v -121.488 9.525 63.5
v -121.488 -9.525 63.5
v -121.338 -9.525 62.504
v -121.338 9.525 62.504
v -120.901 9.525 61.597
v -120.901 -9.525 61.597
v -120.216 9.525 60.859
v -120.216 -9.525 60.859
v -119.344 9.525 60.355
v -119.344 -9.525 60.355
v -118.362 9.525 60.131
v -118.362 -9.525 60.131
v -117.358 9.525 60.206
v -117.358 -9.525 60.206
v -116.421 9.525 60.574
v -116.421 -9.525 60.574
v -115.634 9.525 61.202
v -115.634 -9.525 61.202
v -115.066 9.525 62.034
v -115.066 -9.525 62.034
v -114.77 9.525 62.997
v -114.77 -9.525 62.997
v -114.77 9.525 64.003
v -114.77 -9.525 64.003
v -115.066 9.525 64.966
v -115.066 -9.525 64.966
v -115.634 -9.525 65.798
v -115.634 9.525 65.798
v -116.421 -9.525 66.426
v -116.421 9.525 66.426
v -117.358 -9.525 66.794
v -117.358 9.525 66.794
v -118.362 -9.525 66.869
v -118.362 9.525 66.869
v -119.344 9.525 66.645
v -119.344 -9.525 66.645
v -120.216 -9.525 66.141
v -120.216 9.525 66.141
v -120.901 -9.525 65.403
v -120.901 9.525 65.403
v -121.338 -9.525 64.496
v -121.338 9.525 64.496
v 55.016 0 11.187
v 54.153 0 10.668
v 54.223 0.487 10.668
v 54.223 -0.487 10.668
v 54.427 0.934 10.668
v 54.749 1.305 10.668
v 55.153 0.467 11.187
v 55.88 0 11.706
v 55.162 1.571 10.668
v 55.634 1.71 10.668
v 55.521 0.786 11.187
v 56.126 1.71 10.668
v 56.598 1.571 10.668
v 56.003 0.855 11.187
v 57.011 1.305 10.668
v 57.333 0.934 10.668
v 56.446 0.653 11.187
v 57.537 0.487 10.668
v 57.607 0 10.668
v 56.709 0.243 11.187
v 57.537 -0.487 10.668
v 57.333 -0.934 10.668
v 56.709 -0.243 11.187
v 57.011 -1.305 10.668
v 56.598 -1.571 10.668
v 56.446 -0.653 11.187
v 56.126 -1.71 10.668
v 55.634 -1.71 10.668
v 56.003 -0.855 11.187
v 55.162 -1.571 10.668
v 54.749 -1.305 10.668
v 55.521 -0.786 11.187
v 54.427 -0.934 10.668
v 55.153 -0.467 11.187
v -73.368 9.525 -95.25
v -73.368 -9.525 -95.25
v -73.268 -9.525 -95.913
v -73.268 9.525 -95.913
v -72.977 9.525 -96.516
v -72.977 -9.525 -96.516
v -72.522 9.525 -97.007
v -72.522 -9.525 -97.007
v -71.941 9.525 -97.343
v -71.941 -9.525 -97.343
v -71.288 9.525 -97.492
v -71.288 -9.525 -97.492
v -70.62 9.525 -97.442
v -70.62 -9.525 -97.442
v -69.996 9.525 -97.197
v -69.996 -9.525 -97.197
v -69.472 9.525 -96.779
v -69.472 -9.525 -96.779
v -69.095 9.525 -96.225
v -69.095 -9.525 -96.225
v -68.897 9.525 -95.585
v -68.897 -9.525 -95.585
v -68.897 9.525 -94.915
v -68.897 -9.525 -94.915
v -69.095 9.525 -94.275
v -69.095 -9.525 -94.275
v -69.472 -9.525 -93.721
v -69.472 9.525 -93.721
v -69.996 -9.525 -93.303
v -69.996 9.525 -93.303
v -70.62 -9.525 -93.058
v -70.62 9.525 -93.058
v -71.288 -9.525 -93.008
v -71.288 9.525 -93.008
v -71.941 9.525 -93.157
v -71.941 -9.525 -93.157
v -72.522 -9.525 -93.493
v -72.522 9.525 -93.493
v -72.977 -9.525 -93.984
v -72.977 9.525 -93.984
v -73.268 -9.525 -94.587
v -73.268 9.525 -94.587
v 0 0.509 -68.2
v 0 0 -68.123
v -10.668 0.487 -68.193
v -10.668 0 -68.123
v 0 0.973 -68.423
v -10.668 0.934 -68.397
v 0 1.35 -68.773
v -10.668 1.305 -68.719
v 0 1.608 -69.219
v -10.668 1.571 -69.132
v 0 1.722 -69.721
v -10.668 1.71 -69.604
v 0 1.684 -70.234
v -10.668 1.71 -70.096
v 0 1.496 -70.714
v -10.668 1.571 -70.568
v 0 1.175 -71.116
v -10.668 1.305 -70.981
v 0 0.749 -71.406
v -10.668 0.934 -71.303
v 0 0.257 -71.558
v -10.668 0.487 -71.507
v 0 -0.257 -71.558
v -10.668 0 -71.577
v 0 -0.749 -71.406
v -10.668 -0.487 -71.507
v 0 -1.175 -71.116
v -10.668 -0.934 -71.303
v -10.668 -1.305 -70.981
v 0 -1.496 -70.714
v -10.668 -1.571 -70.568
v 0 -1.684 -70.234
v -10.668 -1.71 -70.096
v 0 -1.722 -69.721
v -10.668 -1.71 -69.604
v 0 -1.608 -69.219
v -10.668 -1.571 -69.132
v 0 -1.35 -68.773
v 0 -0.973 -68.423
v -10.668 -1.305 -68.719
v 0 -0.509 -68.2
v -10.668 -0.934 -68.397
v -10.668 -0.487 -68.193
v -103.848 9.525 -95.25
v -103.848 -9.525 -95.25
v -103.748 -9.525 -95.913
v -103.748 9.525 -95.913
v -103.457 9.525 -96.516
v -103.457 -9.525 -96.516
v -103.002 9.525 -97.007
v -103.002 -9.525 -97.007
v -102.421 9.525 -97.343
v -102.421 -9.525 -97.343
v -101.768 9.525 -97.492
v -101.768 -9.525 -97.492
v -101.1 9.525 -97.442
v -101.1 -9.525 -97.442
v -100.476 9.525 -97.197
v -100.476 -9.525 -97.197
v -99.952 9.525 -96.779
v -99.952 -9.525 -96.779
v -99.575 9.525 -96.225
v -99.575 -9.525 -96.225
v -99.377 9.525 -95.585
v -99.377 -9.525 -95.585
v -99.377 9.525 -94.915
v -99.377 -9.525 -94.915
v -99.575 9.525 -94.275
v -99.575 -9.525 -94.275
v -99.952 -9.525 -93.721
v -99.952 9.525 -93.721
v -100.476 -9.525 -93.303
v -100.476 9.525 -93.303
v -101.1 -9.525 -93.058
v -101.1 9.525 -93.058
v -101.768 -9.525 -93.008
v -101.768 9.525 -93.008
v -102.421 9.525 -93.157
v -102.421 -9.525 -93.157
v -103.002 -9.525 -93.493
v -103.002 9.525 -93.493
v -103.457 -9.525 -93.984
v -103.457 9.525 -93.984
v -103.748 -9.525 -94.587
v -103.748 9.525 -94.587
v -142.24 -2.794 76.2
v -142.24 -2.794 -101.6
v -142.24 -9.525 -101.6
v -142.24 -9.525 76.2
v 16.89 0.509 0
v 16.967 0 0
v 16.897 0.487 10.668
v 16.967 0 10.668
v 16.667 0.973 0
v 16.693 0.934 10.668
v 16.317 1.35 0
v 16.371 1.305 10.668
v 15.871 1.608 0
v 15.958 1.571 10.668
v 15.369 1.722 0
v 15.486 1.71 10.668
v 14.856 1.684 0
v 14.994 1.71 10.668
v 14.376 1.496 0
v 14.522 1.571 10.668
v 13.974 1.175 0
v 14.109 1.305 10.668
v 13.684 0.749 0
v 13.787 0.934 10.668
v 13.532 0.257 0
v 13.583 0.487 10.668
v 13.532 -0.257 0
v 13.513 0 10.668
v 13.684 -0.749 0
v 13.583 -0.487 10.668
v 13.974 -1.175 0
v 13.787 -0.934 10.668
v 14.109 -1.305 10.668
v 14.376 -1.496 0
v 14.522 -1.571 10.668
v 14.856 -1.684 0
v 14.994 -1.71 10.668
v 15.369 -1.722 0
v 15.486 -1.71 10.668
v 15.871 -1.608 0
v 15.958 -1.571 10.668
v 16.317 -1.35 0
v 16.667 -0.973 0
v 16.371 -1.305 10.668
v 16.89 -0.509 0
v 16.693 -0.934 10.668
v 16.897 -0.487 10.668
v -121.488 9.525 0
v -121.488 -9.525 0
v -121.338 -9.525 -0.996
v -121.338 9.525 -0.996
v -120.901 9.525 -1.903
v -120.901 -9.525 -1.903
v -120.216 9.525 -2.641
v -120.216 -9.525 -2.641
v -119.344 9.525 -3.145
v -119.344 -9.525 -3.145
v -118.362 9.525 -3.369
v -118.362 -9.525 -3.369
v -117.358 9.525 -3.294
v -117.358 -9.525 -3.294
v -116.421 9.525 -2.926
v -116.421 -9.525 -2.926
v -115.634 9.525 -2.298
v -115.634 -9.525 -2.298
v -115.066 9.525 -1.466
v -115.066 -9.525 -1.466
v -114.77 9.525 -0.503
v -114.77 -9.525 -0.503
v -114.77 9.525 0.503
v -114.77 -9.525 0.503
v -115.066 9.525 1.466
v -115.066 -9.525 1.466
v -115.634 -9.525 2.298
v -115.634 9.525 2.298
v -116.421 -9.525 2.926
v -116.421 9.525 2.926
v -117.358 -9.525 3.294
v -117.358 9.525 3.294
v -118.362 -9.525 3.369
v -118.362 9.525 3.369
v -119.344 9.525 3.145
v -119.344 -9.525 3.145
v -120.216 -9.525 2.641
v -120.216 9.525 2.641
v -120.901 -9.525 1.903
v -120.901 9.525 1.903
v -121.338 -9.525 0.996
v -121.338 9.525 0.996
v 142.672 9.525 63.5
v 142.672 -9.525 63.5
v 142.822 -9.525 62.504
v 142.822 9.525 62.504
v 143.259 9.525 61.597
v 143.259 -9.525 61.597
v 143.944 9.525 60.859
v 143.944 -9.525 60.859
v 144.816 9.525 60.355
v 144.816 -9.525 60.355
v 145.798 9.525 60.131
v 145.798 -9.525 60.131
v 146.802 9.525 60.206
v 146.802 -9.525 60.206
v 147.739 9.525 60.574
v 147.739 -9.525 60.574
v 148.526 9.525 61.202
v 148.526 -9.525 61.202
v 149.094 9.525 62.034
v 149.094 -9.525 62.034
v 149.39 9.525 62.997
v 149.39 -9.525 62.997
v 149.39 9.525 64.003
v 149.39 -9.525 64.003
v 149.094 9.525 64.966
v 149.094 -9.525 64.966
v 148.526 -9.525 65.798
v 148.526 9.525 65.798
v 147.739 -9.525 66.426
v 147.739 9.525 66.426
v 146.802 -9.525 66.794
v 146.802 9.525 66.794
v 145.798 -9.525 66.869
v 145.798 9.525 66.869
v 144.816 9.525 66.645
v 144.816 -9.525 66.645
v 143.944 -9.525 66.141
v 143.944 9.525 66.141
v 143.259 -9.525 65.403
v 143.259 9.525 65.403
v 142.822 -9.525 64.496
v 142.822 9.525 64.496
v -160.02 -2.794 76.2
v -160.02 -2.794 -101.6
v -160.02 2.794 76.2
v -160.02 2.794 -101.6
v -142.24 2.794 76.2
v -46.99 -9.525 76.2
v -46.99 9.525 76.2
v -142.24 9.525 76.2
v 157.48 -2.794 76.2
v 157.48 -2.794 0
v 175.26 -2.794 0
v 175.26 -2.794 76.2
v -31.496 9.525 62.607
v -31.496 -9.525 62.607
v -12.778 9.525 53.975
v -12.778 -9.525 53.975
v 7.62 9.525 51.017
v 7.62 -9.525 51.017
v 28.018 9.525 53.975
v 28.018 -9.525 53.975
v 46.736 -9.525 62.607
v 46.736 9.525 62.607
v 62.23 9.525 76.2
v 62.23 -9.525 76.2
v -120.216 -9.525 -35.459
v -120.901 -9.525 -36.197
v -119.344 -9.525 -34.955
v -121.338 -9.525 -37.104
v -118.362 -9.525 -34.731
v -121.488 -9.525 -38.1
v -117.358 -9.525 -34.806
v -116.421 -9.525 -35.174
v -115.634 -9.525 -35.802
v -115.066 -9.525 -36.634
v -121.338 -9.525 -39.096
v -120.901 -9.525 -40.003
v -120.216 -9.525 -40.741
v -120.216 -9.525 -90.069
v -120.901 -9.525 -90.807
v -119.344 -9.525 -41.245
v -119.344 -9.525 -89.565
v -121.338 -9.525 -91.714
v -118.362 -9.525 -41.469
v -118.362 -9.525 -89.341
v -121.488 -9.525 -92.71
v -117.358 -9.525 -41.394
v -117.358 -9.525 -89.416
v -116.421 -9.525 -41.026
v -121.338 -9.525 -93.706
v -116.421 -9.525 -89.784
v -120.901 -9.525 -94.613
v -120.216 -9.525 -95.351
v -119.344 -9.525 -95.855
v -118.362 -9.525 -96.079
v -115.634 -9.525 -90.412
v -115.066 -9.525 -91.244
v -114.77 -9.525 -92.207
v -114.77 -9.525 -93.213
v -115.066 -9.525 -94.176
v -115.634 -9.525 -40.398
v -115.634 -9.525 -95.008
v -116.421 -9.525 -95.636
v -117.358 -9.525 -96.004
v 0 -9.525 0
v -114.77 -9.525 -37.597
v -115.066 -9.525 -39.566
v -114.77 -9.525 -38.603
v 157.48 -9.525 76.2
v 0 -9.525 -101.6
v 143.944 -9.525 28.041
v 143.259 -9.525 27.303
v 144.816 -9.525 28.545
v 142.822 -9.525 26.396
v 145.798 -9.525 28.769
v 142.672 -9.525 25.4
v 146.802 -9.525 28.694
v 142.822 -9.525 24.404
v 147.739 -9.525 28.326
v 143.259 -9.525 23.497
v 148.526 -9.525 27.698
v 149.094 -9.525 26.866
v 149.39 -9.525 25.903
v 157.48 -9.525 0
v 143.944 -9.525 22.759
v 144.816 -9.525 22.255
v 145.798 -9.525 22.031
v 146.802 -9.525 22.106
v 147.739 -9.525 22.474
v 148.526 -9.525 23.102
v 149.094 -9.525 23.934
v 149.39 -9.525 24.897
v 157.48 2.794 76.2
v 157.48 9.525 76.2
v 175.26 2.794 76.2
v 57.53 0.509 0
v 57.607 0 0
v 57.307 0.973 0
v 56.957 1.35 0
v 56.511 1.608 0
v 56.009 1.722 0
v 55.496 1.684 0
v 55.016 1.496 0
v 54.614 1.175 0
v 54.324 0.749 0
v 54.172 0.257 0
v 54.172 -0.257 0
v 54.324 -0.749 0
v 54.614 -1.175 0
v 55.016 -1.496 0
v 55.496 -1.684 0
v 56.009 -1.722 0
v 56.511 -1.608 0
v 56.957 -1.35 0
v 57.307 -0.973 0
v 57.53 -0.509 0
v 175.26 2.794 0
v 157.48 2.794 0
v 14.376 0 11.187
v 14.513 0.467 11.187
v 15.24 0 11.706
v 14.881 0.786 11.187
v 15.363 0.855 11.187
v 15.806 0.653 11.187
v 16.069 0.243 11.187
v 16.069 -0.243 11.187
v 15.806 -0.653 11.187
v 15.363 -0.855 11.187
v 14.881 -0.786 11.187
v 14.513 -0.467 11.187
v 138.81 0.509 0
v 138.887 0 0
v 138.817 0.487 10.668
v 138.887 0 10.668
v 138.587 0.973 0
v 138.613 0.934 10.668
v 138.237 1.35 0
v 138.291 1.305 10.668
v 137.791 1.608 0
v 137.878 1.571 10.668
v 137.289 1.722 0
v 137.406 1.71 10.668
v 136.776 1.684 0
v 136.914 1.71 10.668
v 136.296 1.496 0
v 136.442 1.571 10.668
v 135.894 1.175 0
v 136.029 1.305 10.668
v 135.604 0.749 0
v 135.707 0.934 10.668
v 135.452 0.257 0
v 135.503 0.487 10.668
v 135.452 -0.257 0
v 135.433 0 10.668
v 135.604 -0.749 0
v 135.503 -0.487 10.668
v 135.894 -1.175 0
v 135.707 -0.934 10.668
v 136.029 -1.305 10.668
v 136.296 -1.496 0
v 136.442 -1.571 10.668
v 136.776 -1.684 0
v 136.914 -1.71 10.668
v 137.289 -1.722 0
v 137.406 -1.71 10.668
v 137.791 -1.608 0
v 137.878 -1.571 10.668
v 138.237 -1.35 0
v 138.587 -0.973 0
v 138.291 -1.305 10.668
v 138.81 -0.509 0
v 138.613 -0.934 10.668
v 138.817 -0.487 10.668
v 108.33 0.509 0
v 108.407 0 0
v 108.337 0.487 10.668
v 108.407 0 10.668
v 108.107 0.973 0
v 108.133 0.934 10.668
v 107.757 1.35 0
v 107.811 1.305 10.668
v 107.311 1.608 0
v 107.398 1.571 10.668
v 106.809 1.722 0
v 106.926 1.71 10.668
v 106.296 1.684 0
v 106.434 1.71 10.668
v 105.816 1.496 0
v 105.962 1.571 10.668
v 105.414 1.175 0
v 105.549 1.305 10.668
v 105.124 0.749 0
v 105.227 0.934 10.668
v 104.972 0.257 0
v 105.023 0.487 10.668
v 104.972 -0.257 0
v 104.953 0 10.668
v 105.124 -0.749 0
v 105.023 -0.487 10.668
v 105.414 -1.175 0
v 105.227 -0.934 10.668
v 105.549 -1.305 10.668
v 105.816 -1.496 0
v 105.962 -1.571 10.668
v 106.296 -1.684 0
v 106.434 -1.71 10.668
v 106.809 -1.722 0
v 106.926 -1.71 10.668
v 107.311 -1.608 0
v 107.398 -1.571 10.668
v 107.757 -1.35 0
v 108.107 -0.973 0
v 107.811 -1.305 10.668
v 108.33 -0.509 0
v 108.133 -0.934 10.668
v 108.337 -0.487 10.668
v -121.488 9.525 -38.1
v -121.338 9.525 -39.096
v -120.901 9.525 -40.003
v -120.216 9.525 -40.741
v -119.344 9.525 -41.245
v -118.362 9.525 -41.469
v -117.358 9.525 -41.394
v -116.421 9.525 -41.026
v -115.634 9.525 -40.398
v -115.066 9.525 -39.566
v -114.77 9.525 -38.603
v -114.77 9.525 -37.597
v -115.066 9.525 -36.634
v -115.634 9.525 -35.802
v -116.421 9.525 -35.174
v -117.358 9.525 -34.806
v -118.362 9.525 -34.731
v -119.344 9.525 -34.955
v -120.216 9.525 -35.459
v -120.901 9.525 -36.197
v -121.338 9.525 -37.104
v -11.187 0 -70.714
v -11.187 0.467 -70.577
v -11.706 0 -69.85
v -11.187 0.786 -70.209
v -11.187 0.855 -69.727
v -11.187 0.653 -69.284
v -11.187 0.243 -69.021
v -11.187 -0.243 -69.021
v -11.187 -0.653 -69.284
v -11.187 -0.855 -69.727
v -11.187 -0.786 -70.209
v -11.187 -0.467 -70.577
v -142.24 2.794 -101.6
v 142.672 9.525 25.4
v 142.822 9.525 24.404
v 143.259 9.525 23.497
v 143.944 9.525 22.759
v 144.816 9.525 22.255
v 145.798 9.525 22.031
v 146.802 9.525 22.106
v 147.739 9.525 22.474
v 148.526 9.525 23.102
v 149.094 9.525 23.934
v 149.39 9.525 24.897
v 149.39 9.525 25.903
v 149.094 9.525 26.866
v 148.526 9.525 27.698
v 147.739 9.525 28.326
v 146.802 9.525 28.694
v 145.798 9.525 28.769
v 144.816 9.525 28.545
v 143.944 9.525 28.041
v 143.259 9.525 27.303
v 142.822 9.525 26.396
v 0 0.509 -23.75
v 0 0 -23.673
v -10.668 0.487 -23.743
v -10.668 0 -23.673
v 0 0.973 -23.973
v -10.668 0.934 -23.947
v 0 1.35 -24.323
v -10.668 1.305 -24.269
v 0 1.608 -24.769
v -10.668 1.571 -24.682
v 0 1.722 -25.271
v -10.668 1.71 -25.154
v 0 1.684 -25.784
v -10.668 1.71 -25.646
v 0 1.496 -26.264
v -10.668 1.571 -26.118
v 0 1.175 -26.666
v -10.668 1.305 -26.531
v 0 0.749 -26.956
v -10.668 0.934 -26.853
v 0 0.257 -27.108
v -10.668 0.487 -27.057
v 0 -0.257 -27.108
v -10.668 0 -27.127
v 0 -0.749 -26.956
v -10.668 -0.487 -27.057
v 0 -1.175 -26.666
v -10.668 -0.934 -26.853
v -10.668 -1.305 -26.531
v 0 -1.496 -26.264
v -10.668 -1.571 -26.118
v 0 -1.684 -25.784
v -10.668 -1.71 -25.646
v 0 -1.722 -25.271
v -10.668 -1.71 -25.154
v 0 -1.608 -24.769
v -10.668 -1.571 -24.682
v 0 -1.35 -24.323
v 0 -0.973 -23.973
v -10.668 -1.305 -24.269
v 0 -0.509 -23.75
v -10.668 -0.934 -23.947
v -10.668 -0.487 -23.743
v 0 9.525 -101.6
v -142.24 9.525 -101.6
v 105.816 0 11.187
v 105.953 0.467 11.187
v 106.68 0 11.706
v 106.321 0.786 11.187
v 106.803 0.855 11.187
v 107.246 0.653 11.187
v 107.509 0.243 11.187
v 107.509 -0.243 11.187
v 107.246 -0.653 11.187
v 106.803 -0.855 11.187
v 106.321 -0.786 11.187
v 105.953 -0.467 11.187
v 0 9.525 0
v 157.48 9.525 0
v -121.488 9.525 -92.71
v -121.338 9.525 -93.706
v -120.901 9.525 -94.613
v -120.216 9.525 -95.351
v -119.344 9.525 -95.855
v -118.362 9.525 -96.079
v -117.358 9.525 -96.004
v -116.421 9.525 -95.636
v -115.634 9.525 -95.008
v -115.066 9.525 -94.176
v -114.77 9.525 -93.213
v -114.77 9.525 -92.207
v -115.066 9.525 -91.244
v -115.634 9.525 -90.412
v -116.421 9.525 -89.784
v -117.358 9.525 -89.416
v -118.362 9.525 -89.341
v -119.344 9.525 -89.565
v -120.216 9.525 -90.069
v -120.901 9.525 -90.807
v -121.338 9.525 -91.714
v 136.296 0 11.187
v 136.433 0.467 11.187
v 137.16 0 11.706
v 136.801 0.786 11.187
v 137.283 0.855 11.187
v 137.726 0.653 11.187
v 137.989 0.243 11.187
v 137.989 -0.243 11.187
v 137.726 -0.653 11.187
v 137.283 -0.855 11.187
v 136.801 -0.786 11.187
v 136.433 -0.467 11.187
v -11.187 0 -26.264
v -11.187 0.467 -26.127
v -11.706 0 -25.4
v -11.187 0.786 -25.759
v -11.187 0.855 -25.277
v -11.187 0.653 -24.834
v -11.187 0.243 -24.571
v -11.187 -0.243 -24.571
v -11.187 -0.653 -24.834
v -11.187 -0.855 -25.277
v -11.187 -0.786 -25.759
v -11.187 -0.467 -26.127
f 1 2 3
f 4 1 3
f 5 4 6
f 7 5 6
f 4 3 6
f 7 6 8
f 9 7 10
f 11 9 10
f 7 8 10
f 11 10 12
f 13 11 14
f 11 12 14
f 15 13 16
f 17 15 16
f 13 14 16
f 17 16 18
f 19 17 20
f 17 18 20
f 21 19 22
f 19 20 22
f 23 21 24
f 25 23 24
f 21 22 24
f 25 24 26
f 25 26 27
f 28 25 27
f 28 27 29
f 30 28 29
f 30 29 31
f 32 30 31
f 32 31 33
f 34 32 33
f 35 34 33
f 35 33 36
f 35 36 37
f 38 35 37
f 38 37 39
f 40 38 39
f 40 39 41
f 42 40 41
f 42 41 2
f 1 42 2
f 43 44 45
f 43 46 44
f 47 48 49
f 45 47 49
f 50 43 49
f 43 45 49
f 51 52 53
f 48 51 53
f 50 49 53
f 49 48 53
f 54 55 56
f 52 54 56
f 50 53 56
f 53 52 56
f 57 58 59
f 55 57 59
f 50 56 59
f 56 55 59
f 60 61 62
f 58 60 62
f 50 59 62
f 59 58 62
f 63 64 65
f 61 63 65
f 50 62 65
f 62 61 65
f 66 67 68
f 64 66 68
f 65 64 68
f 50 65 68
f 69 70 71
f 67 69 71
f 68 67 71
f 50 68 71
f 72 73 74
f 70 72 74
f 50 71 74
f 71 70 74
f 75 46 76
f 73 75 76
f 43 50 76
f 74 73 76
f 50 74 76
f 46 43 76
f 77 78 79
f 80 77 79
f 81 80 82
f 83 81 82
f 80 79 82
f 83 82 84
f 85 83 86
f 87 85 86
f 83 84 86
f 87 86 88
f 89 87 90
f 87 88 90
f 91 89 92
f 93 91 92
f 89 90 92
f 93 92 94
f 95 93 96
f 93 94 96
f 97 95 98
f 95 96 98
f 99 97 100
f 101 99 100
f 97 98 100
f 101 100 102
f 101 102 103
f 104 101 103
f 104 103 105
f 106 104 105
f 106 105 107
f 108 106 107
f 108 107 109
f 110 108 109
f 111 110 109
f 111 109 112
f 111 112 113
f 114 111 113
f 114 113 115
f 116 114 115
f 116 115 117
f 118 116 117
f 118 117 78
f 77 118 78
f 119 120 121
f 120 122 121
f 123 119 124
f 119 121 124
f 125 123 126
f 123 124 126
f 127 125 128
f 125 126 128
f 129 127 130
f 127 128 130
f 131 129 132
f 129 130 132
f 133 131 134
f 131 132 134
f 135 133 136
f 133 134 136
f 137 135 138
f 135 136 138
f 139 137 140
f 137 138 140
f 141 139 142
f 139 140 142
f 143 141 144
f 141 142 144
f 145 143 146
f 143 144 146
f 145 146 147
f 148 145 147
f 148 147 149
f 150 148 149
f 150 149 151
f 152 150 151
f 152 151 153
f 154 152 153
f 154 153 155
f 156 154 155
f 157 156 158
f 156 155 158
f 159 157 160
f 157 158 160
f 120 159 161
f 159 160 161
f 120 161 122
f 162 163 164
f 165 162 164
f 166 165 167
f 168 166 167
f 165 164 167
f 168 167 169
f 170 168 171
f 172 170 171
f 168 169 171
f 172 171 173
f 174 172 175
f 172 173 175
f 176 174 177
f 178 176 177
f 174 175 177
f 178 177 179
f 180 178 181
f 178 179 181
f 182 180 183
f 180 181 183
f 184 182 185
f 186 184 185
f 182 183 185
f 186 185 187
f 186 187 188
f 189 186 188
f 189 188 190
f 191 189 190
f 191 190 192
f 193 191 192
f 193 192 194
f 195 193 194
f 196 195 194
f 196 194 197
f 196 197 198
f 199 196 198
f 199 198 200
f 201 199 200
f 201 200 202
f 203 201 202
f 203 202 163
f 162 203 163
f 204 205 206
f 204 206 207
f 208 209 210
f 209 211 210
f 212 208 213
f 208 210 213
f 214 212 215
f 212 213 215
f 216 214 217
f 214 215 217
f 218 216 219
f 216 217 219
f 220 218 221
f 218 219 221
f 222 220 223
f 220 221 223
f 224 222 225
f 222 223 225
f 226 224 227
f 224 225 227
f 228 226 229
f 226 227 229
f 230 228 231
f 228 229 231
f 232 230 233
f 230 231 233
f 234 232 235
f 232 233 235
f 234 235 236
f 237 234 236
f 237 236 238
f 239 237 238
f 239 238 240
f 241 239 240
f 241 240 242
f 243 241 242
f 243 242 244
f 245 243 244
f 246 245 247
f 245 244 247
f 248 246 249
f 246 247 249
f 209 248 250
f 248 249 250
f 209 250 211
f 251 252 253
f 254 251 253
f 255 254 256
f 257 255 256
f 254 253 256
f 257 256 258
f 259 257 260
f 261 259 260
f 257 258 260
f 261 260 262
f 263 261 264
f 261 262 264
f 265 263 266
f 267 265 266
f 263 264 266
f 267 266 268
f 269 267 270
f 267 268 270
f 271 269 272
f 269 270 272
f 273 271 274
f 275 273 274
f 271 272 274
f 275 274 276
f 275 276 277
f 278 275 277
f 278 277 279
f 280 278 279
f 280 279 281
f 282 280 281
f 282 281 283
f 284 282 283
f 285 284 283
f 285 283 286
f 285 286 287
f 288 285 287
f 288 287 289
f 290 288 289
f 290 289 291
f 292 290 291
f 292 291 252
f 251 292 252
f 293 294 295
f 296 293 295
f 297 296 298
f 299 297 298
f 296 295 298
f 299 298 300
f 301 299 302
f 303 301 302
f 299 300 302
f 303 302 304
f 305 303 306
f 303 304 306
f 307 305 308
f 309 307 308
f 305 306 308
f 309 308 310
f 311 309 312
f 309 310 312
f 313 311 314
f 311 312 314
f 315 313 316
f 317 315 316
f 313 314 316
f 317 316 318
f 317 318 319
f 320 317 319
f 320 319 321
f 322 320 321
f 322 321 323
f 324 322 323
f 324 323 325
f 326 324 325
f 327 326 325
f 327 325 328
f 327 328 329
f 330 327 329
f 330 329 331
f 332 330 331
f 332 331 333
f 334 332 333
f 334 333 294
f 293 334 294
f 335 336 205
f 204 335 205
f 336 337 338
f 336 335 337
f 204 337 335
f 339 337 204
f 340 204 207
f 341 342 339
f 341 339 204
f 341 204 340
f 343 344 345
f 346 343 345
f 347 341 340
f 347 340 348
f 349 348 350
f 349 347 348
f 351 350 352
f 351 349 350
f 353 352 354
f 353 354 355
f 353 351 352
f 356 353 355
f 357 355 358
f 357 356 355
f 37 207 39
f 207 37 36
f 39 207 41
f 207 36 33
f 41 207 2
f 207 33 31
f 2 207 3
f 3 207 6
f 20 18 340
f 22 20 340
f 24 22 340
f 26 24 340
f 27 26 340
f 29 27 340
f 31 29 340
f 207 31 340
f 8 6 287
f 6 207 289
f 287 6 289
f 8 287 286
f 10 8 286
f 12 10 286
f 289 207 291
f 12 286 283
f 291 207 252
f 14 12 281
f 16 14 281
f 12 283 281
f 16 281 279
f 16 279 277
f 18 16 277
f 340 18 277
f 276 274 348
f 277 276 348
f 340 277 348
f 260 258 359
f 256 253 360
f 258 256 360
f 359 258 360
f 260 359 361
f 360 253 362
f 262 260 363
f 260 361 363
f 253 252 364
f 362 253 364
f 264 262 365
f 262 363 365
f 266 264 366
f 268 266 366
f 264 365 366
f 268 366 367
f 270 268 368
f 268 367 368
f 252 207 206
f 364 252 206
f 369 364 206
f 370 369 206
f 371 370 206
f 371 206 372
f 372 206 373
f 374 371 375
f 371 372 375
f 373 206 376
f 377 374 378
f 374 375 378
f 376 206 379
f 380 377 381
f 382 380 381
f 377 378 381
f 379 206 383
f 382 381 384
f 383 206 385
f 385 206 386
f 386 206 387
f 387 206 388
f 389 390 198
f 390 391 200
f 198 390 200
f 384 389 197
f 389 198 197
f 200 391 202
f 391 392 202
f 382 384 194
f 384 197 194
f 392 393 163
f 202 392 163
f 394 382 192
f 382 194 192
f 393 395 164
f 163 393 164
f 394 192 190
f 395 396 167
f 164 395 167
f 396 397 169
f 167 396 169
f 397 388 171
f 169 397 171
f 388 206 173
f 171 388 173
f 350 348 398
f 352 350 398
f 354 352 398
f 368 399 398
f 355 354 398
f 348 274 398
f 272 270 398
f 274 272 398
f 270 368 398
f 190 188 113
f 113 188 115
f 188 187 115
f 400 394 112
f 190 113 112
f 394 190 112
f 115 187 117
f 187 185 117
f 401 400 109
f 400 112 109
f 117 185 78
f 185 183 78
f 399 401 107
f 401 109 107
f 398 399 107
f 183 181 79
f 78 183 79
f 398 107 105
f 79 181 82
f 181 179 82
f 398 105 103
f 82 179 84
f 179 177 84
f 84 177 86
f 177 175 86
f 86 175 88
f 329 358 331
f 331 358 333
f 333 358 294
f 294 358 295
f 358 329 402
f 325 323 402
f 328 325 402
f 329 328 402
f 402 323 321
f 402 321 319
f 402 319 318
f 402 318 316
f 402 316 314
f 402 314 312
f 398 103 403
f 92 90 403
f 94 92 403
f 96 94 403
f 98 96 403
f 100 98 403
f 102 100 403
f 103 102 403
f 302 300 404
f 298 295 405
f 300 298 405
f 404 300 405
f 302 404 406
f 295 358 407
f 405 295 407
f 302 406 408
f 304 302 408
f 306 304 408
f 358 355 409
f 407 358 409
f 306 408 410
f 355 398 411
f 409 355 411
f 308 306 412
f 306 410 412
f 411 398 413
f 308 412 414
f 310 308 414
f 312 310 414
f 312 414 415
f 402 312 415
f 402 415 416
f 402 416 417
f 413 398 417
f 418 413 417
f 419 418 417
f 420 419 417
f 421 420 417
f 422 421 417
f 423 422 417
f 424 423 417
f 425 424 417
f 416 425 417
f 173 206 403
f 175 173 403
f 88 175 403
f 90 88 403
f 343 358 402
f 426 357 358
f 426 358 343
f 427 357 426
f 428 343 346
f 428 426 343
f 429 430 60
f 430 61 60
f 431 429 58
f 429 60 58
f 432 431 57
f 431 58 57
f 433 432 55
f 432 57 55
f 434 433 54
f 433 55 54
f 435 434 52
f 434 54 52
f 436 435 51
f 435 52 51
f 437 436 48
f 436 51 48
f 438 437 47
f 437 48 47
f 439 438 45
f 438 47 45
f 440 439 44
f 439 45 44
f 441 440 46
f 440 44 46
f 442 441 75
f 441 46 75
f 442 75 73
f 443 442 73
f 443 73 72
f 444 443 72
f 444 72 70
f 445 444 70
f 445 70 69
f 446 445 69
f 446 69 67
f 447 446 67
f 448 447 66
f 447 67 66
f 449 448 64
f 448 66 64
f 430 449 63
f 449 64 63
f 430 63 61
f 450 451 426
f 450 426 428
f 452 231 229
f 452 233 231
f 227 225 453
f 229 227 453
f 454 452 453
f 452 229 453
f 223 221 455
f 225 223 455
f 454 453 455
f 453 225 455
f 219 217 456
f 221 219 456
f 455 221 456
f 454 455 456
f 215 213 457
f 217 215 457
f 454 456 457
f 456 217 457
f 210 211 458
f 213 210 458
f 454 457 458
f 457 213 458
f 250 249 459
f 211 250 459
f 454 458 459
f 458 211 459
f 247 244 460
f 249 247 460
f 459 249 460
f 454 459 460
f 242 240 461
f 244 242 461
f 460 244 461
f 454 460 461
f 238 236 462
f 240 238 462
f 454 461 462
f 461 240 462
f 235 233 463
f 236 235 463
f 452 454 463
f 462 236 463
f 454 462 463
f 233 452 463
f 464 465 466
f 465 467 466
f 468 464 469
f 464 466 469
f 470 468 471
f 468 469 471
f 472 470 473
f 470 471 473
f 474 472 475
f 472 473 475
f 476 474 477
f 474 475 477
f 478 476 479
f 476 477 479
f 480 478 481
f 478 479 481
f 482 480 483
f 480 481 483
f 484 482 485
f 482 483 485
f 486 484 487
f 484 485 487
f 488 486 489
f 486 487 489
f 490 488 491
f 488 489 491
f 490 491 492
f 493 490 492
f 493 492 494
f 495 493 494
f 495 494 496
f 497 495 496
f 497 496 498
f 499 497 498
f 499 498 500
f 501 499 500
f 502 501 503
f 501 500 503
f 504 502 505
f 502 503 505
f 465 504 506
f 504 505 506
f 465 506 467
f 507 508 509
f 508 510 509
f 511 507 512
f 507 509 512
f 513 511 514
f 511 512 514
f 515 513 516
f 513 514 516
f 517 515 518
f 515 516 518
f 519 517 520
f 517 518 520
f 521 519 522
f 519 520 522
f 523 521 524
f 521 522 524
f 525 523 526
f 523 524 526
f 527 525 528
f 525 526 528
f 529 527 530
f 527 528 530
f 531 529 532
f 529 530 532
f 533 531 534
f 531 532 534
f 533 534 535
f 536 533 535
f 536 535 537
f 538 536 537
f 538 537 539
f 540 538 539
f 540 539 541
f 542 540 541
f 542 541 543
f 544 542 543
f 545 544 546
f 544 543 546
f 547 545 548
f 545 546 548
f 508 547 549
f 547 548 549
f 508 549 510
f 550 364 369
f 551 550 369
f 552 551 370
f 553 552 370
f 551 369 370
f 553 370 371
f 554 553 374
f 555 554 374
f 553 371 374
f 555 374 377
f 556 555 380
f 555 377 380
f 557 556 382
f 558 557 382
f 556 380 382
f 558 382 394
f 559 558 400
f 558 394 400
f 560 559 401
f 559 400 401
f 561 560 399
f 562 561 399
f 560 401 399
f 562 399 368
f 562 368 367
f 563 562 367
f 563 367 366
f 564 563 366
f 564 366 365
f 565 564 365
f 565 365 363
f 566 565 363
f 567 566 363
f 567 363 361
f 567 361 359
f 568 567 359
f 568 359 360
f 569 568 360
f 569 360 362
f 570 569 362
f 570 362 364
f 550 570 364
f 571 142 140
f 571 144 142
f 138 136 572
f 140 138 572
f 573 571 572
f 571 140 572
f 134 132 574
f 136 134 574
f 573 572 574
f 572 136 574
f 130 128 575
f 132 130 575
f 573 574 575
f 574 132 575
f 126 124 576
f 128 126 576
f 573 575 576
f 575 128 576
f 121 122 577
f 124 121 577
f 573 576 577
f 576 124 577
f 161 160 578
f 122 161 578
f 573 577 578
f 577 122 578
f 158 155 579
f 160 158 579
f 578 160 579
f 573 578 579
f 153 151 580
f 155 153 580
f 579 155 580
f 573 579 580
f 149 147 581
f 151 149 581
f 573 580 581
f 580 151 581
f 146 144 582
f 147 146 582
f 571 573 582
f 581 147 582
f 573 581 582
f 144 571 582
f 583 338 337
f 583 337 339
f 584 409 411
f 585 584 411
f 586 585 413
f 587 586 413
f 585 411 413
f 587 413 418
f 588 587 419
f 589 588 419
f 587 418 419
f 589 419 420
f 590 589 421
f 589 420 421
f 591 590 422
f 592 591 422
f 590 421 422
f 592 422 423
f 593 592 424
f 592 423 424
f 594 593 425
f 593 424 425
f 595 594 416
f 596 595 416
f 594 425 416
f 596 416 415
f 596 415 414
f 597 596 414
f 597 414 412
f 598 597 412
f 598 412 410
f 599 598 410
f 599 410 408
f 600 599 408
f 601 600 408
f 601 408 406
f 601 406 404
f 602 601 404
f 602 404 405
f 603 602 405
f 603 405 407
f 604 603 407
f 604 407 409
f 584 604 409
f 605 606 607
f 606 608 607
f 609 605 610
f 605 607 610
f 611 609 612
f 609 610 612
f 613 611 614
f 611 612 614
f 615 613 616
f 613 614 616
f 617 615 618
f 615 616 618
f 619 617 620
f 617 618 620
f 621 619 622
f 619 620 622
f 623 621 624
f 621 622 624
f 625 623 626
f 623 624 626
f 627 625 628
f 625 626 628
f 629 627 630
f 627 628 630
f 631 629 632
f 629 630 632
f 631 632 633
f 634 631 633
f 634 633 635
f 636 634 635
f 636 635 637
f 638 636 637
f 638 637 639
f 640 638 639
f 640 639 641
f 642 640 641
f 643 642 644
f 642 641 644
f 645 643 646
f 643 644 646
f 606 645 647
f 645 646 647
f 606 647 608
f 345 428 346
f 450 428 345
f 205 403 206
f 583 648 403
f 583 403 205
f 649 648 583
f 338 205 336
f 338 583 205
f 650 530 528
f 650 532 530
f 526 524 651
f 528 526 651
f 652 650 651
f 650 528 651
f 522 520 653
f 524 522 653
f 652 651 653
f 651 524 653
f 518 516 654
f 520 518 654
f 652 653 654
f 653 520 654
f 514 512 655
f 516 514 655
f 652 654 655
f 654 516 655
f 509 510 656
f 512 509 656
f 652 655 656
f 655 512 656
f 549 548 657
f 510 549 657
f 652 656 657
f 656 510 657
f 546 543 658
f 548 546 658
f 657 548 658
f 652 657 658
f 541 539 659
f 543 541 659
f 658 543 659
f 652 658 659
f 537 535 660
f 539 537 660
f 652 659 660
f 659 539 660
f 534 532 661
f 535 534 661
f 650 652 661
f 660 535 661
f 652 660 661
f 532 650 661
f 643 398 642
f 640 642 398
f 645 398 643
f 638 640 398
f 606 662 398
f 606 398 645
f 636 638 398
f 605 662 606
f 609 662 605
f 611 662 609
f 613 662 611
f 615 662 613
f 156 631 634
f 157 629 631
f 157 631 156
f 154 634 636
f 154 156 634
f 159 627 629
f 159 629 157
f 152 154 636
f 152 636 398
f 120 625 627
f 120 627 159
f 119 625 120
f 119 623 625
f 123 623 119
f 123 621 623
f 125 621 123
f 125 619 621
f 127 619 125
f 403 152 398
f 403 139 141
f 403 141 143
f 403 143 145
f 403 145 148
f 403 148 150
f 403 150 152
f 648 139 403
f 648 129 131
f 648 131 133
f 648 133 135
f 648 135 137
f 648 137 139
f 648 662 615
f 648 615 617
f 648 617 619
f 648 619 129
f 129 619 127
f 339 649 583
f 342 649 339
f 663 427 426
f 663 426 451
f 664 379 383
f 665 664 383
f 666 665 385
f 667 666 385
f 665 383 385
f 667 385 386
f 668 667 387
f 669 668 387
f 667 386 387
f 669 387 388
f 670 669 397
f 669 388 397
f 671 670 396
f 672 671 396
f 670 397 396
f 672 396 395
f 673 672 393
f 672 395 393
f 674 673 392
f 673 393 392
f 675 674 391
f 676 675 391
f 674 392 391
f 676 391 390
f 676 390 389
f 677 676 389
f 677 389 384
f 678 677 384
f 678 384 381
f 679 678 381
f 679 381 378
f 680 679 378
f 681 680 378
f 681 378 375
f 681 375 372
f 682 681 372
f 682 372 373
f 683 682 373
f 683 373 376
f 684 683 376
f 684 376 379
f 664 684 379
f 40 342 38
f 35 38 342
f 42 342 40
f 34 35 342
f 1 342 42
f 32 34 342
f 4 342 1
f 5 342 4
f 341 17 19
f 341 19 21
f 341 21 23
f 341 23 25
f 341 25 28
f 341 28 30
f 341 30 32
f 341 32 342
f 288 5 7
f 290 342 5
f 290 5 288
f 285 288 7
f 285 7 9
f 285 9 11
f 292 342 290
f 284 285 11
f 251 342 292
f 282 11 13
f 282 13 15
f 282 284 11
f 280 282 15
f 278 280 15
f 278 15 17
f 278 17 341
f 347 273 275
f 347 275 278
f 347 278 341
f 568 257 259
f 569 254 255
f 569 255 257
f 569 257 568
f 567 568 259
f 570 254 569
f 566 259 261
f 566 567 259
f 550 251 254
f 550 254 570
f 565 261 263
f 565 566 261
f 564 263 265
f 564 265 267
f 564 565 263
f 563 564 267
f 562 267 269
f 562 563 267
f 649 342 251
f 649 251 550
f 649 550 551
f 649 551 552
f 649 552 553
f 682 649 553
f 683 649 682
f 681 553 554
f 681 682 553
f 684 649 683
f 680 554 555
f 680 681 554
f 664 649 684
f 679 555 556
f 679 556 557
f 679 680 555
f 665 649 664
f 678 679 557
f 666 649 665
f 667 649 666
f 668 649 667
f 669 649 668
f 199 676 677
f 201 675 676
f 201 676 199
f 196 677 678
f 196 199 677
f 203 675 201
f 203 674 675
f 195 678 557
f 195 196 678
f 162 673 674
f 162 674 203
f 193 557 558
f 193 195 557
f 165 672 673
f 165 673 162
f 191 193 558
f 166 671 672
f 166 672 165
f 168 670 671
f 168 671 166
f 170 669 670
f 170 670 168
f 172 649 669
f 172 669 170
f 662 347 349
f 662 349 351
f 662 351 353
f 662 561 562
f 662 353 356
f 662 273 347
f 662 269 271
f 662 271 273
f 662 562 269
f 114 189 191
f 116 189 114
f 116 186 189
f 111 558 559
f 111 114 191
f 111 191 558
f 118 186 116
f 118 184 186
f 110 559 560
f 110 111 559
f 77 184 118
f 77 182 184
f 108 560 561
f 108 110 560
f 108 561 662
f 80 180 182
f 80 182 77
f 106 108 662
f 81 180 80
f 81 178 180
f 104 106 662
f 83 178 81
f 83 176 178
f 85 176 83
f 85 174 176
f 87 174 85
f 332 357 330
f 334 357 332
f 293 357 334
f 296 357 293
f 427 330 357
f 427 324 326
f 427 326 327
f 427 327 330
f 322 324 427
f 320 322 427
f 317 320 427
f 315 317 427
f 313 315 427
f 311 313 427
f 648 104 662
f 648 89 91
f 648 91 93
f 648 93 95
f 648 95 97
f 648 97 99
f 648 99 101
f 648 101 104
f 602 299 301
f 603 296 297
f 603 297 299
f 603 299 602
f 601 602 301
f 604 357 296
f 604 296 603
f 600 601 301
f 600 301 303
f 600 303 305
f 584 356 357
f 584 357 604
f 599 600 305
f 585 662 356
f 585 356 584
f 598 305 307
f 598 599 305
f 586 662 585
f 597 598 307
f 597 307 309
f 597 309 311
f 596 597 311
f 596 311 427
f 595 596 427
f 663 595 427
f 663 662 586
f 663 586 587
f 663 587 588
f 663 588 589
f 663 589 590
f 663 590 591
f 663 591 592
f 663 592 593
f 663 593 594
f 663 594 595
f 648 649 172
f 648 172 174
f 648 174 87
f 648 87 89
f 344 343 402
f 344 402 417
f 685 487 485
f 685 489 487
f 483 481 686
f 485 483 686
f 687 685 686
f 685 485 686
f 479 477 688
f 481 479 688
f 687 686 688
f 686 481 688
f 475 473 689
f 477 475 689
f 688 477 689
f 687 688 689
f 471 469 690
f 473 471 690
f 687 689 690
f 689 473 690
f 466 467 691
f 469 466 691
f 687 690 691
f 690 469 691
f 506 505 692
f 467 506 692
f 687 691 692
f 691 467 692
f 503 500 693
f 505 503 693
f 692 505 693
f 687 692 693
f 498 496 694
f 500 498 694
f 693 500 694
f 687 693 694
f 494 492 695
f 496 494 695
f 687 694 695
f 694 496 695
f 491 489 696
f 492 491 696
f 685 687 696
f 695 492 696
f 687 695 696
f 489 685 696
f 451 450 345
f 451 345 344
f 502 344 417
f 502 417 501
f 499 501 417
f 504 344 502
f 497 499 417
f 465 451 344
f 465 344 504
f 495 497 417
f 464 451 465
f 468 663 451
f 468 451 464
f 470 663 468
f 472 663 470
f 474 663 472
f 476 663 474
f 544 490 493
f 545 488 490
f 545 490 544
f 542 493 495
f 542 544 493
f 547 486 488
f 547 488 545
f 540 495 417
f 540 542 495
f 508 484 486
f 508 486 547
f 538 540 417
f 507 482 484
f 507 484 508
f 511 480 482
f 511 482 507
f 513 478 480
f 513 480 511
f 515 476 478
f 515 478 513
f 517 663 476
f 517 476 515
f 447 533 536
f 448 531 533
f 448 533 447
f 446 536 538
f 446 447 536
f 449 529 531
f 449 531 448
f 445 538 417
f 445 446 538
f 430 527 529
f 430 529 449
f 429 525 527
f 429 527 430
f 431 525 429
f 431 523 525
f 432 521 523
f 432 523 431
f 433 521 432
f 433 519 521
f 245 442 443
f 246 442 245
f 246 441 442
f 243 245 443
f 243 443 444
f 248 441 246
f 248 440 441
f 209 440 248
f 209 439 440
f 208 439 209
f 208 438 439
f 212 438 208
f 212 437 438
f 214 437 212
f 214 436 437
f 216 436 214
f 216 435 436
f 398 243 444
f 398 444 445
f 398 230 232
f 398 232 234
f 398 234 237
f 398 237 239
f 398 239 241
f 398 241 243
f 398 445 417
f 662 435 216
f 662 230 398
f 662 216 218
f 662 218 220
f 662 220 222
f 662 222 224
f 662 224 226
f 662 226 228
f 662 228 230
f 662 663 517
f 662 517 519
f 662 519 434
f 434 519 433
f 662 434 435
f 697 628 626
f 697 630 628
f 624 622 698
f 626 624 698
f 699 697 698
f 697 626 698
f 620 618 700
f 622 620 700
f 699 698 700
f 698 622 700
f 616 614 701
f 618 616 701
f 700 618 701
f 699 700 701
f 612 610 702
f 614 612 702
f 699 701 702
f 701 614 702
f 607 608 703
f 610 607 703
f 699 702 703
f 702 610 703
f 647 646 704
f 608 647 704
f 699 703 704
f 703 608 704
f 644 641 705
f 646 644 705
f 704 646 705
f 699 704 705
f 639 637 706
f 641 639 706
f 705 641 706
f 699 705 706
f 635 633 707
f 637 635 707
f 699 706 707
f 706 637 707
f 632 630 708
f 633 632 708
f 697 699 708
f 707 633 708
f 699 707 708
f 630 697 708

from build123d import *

# Parameters (mm, degrees)
BOSS_EXTRUDE1_DEPTH       = 9.525
SKETCH2_W                 = 17.78
SKETCH2_H                 = 177.8
SKETCH2_H_2               = 76.2
BOSS_EXTRUDE2_DEPTH       = 2.794
F_1_4_CLEARANCE_HOLE1_D   = 6.7564
F_8_CLEARANCE_HOLE1_D     = 4.4958
F_1_4_CLEARANCE_HOLE2_D   = 6.7564
F_8_32_TAPPED_HOLE1_D     = 3.4544
F_8_32_TAPPED_HOLE1_DEPTH = 10.668
F_8_32_TAPPED_HOLE1_TIP   = 1.037806461
F_8_32_TAPPED_HOLE2_D     = 3.4544
F_8_32_TAPPED_HOLE2_DEPTH = 10.668
F_8_32_TAPPED_HOLE2_TIP   = 1.037806461


with BuildPart() as part:
    # Sketch1 → Boss-Extrude1 (new, symmetric)
    with BuildSketch(Plane(origin=(0, 0, 0), x_dir=(1, 0, 0), z_dir=(0, 1, 0))):
        with BuildLine():
            Line((0, 101.6), (-142.24, 101.6))
            Line((-142.24, 101.6), (-142.24, -76.2))
            Line((-142.24, -76.2), (-46.99, -76.2))
            ThreePointArc((-46.99, -76.2), (7.62, -51.017030863), (62.23, -76.2))
            Line((62.23, -76.2), (157.48, -76.2))
            Line((157.48, -76.2), (157.48, 0))
            Line((157.48, 0), (0, 0))
            Line((0, 0), (0, 101.6))
        make_face()
    extrude(amount=BOSS_EXTRUDE1_DEPTH, both=True)

    # Sketch2 → Boss-Extrude2 (add, symmetric)
    with BuildSketch(Plane(origin=(0, 0, 0), x_dir=(1, 0, 0), z_dir=(0, 1, 0))):
        with Locations((-151.13, 12.7)):
            Rectangle(SKETCH2_W, SKETCH2_H)
        with Locations((166.37, -38.1)):
            Rectangle(SKETCH2_W, SKETCH2_H_2)
    extrude(amount=BOSS_EXTRUDE2_DEPTH, both=True)

    # 1/4 Clearance Hole1 (through all)
    with Locations(Plane(origin=(0, 9.525, 0), x_dir=(1, 0, 0), z_dir=(0, 1, 0))):
        with Locations((-118.11, 92.71), (-118.11, 38.1), (-118.11, 0), (-118.11, -63.5)):
            Hole(F_1_4_CLEARANCE_HOLE1_D / 2)

    # #8 Clearance Hole1 (through all)
    with Locations(Plane(origin=(0, 9.525, 0), x_dir=(1, 0, 0), z_dir=(0, 1, 0))):
        with Locations((-101.6, 95.25), (-71.12, 95.25)):
            Hole(F_8_CLEARANCE_HOLE1_D / 2)

    # 1/4 Clearance Hole2 (through all)
    with Locations(Plane(origin=(0, 9.525, 0), x_dir=(1, 0, 0), z_dir=(0, 1, 0))):
        with Locations((146.05, -25.4), (146.05, -63.5)):
            Hole(F_1_4_CLEARANCE_HOLE2_D / 2)

    # #8-32 Tapped Hole1
    with Locations(Plane(origin=(0, 0, 0), x_dir=(-1, 0, 0), z_dir=(0, 0, -1))):
        with Locations((-137.16, 0), (-106.68, 0), (-55.88, 0), (-15.24, 0)):
            Hole(F_8_32_TAPPED_HOLE1_D / 2, depth=F_8_32_TAPPED_HOLE1_DEPTH)
            with Locations((0, 0, -(F_8_32_TAPPED_HOLE1_DEPTH + F_8_32_TAPPED_HOLE1_TIP / 2))):  # 118° drill point
                Cone(0, F_8_32_TAPPED_HOLE1_D / 2, F_8_32_TAPPED_HOLE1_TIP, mode=Mode.SUBTRACT)

    # #8-32 Tapped Hole2
    with Locations(Plane(origin=(0, 0, 0), x_dir=(0, 0, -1), z_dir=(1, 0, 0))):
        with Locations((69.85, 0), (25.4, 0)):
            Hole(F_8_32_TAPPED_HOLE2_D / 2, depth=F_8_32_TAPPED_HOLE2_DEPTH)
            with Locations((0, 0, -(F_8_32_TAPPED_HOLE2_DEPTH + F_8_32_TAPPED_HOLE2_TIP / 2))):  # 118° drill point
                Cone(0, F_8_32_TAPPED_HOLE2_D / 2, F_8_32_TAPPED_HOLE2_TIP, mode=Mode.SUBTRACT)


solid = part.part
